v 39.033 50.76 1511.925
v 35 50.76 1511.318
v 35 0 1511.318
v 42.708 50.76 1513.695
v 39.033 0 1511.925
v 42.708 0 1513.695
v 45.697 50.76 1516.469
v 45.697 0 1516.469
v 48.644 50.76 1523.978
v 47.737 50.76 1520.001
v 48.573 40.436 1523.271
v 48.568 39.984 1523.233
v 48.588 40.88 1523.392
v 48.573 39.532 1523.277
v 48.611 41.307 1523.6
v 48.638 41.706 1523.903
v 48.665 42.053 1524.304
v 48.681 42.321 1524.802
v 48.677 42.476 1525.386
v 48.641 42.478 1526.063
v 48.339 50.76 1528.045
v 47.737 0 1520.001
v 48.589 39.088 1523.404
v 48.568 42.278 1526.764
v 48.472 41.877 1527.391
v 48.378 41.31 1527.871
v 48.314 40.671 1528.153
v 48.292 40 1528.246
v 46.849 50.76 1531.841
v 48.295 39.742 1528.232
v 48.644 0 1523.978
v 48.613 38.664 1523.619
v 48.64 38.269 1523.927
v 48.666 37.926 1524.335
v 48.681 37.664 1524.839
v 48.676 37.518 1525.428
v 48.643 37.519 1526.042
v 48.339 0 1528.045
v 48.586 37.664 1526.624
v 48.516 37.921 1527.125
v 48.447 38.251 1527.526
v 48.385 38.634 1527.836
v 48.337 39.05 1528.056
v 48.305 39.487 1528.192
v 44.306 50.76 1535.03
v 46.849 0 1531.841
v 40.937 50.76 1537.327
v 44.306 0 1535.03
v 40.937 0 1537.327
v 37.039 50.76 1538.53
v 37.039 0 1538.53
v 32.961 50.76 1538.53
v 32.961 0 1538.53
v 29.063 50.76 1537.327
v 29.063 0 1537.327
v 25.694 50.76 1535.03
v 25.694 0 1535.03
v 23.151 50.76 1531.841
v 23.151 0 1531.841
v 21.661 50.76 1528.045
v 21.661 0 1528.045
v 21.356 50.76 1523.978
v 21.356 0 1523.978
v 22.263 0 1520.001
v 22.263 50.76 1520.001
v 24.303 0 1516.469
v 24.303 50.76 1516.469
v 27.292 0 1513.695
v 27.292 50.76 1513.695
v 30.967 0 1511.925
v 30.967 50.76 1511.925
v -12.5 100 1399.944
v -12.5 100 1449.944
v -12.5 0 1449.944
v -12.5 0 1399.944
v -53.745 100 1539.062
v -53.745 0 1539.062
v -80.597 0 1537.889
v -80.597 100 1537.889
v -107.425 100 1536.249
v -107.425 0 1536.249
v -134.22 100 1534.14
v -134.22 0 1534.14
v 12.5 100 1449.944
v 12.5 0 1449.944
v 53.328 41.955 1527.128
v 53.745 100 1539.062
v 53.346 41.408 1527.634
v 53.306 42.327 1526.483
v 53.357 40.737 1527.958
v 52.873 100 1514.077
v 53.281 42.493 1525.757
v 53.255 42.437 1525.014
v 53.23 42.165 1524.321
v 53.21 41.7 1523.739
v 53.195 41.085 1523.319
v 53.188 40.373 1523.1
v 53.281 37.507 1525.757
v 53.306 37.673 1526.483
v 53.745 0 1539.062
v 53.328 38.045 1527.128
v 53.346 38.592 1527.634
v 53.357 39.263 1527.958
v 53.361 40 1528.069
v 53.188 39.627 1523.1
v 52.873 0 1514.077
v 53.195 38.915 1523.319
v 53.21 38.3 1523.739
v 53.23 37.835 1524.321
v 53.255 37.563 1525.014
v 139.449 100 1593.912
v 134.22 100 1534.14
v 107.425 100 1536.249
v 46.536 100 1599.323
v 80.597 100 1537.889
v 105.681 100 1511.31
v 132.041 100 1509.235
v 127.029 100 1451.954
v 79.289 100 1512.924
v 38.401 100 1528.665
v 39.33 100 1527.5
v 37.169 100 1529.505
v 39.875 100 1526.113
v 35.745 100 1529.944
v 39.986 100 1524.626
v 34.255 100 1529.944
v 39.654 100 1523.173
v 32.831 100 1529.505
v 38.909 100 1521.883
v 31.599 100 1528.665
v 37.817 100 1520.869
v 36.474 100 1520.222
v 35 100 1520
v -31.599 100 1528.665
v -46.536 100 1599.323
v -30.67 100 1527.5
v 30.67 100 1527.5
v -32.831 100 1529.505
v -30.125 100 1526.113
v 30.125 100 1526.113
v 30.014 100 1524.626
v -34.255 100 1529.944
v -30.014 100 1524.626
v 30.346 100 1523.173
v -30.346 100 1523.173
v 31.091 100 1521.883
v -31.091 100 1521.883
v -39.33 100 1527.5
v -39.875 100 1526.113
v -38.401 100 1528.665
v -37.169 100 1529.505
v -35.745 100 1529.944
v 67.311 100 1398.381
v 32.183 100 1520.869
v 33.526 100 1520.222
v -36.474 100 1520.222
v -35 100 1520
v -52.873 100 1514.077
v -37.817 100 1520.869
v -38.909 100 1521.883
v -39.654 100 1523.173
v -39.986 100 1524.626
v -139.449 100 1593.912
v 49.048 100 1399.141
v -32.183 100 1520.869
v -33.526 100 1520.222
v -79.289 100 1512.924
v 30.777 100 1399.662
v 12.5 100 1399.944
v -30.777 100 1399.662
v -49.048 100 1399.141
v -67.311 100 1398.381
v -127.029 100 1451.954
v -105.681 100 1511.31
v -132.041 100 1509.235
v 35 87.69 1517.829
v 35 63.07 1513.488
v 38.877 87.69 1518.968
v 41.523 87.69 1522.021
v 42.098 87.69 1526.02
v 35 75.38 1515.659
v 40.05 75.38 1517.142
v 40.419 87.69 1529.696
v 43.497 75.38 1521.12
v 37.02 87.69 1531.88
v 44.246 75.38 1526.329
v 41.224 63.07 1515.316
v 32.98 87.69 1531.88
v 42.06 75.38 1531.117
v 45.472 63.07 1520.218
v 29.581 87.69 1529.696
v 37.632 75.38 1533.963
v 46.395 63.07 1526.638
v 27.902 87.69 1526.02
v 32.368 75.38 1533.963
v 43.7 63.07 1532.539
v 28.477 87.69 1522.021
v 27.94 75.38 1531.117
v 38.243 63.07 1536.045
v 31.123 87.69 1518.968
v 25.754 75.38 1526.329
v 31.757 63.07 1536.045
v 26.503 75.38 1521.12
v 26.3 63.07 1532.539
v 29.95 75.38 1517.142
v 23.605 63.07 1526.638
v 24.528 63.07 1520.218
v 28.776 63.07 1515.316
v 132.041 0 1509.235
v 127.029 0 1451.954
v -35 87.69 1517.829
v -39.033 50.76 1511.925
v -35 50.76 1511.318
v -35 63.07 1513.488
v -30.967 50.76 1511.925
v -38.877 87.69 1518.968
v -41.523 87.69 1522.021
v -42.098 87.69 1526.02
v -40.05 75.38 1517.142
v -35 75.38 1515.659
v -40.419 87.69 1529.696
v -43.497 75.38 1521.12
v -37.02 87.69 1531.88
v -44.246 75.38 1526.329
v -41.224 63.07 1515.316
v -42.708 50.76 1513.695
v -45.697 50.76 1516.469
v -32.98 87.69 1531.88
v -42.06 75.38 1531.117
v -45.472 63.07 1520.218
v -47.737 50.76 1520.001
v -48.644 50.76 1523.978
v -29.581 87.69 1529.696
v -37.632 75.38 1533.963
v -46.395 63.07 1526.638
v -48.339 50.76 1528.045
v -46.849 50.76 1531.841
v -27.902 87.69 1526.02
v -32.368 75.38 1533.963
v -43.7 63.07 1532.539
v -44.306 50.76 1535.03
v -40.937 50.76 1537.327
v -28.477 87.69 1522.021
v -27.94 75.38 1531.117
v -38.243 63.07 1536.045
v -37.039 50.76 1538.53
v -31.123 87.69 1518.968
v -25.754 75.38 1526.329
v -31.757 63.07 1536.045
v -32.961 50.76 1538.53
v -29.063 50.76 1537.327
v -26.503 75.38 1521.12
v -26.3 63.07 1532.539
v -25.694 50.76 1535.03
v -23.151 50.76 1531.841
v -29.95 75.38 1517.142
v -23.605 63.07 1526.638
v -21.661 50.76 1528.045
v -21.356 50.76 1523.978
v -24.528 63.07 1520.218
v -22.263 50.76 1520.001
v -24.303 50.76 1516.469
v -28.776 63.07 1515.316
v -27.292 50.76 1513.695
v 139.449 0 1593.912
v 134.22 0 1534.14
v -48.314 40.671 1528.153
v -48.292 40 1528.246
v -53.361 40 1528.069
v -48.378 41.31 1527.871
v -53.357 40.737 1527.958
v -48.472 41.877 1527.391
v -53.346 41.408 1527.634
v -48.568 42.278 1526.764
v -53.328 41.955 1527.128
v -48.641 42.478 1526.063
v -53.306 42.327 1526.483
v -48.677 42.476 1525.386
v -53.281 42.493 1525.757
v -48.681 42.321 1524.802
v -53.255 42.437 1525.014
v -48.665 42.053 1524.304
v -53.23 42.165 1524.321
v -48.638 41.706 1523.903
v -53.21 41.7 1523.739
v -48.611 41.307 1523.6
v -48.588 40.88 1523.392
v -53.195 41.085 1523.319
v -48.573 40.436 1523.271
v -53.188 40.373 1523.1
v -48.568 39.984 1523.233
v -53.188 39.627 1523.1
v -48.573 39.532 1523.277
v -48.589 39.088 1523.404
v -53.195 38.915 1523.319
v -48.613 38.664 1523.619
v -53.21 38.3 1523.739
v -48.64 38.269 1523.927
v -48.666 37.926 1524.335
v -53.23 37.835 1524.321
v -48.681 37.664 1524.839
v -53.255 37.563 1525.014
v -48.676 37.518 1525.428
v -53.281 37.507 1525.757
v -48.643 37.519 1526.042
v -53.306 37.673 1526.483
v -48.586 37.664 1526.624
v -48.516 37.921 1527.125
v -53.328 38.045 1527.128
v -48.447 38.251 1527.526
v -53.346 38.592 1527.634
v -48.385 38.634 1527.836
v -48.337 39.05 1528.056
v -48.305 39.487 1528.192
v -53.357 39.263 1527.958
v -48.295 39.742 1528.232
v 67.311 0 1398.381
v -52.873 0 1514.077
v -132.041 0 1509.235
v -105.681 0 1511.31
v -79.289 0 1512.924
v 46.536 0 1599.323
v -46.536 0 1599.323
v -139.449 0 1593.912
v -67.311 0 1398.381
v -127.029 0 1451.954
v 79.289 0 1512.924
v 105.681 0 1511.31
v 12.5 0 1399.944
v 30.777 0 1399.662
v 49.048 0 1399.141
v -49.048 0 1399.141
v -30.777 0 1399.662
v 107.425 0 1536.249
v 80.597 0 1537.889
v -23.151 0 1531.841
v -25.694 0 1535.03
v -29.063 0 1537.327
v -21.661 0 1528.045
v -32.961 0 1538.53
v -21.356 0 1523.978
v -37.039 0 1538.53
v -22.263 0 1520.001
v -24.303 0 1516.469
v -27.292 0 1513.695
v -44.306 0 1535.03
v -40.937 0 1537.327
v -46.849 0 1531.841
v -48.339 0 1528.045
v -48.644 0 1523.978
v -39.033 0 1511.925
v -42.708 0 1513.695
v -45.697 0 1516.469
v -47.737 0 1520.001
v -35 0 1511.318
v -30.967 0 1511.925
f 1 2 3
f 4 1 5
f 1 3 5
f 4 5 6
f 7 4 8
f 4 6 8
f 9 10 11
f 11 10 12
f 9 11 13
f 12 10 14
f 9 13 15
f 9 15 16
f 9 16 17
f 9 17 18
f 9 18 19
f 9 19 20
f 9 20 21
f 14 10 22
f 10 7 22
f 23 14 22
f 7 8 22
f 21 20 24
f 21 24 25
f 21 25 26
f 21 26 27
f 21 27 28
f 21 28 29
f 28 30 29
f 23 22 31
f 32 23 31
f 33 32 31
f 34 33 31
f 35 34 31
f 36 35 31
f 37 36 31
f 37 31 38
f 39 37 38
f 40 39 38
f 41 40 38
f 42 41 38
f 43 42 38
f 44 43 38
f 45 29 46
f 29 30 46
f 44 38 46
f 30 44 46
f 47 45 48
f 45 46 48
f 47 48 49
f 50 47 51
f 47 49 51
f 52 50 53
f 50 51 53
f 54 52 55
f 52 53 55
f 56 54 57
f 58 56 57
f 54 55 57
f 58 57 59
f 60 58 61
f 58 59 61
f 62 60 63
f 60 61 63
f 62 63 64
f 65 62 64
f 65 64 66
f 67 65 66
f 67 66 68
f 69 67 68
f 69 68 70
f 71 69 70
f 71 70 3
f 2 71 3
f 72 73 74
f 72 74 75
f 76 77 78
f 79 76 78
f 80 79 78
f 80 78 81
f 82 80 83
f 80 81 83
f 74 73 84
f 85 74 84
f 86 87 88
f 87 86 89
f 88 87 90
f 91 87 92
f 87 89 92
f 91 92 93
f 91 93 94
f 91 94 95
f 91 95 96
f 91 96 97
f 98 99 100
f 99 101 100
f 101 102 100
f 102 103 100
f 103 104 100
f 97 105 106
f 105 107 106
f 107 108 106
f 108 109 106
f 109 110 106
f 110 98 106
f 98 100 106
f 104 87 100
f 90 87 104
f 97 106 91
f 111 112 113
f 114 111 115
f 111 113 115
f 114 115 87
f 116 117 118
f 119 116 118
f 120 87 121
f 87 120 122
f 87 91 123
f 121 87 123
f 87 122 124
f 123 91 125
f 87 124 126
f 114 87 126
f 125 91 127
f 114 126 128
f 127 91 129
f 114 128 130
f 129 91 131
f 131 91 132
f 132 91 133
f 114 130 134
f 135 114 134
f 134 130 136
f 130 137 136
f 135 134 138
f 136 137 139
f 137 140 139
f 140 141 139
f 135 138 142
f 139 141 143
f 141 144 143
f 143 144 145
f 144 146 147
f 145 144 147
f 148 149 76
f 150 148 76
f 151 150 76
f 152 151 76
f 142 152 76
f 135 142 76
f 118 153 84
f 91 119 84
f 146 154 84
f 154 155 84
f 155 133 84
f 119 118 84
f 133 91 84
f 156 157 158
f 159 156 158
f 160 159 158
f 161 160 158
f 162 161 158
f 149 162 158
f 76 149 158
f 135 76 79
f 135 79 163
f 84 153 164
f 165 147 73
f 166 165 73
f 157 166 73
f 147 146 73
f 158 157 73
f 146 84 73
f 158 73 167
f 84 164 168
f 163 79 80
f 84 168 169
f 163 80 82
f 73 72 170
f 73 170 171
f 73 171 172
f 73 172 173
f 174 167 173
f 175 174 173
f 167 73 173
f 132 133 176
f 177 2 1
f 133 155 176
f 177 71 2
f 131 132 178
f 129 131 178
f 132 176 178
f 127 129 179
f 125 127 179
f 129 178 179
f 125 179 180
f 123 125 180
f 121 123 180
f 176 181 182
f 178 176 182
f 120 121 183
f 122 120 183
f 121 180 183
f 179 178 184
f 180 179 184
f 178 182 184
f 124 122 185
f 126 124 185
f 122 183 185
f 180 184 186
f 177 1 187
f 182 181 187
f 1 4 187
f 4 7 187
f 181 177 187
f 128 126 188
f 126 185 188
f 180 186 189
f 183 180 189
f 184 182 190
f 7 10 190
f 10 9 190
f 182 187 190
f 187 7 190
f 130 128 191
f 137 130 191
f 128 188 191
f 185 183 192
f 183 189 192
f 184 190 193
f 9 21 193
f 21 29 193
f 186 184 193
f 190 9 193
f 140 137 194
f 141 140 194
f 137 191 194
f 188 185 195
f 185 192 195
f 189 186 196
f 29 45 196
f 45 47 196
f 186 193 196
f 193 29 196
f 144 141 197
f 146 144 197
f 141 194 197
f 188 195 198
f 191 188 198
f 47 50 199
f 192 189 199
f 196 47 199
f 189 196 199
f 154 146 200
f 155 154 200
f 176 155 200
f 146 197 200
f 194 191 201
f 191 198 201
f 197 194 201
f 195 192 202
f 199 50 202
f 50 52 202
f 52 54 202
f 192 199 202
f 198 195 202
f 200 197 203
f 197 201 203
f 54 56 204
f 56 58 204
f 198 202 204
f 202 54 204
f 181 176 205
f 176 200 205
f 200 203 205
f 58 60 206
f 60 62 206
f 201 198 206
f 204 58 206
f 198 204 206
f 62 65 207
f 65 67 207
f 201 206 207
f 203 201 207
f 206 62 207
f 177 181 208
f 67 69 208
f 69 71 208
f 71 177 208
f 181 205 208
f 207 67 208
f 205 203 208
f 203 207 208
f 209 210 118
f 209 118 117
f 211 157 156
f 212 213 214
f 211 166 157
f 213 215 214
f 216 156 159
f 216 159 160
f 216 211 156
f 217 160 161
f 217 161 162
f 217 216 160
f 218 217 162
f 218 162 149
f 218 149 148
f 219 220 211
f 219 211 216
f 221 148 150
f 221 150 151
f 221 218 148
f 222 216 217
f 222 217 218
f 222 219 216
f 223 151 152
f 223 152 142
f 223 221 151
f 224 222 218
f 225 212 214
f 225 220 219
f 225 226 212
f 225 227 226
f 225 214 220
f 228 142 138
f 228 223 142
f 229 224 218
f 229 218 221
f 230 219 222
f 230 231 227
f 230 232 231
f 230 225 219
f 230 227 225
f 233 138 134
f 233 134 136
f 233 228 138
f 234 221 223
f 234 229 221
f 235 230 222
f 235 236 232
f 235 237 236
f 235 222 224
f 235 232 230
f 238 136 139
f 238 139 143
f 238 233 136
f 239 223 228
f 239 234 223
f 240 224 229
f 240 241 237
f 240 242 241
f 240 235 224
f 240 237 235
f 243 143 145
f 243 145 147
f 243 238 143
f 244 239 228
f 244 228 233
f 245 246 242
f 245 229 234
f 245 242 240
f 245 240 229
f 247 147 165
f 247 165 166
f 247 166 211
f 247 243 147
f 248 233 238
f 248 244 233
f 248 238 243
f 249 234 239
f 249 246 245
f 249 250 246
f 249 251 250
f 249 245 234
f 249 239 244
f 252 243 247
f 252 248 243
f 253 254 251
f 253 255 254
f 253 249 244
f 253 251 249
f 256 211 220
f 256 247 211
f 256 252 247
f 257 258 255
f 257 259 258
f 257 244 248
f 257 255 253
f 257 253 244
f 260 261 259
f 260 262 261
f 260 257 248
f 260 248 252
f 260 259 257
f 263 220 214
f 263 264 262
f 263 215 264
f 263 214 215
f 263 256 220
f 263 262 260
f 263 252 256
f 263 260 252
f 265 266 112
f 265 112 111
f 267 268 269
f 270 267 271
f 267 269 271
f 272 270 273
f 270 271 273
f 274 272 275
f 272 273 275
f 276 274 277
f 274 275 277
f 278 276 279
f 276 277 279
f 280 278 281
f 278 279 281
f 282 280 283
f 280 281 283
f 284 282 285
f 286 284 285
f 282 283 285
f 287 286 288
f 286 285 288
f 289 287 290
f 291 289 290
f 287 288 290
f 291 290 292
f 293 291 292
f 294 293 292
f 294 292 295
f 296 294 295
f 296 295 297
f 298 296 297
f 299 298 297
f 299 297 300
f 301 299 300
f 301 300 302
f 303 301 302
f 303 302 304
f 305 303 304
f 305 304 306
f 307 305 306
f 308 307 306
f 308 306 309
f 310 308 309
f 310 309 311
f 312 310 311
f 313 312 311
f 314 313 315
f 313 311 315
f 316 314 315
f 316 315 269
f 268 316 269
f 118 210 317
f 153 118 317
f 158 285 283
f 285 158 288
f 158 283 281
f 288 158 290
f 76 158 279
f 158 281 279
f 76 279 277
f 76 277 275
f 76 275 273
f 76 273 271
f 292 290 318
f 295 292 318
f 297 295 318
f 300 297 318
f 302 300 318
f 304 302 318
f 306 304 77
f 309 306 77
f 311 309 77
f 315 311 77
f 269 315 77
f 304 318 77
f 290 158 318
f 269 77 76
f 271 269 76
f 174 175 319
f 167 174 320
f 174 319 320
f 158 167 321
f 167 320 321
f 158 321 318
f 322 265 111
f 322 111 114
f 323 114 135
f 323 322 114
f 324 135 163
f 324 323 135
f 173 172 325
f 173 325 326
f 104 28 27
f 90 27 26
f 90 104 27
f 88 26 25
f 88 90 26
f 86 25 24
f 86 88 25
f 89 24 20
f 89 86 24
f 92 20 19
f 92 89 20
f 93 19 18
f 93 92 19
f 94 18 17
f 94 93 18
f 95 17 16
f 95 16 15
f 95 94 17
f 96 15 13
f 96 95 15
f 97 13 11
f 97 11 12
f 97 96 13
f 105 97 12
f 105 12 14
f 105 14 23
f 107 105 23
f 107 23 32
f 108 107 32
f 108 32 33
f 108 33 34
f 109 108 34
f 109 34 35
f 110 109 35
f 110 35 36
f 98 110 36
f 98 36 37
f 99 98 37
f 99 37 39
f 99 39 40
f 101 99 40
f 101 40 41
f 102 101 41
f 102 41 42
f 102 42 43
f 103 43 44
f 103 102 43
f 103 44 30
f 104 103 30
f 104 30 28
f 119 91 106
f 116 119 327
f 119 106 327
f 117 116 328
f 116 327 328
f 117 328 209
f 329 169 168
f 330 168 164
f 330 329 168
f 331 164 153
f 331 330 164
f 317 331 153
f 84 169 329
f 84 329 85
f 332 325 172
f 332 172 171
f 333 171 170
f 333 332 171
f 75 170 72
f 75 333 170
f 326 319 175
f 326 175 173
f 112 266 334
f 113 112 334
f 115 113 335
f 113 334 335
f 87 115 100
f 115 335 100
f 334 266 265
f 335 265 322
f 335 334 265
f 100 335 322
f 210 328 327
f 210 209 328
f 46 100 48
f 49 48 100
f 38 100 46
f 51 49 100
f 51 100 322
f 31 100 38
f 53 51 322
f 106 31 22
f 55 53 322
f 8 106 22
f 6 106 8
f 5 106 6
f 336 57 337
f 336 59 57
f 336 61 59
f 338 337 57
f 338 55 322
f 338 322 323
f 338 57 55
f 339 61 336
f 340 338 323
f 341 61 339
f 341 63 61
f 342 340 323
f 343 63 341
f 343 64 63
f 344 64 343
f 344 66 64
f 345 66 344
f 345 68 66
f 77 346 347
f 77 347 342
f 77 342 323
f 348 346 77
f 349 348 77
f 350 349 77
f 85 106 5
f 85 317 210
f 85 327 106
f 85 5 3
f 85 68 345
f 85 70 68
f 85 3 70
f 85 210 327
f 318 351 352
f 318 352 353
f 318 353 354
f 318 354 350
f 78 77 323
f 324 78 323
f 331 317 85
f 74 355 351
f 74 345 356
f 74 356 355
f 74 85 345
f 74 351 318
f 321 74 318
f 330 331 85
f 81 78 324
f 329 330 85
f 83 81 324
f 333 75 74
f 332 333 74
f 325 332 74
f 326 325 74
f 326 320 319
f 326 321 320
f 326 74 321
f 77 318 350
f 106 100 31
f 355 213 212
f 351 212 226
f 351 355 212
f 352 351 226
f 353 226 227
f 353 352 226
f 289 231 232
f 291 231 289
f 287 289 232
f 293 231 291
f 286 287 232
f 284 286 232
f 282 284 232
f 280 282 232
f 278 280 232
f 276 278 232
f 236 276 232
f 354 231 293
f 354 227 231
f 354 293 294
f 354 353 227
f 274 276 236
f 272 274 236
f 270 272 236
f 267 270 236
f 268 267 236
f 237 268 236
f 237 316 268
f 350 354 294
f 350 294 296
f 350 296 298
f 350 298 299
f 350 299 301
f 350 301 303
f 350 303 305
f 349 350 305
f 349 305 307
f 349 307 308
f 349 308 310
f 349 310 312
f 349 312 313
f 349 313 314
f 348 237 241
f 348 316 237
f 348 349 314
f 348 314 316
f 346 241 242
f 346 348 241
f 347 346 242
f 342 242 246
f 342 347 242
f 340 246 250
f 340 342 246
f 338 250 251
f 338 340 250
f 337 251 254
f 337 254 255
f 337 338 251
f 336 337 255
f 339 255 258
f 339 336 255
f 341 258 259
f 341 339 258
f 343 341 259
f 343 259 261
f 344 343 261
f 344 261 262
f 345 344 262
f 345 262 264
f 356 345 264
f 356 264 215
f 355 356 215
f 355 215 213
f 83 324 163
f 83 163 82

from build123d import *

# Parameters (mm, degrees)
EXTRUDE_1_DEPTH         = 100
CUT_EXTRUDE_2_DEPTH     = 1610.175588972
CUT_EXTRUDE_7_DEPTH     = 1610.175588972
HOLE_WIZARD_M6_1_REACH  = 1611.176
HOLE_WIZARD_M6_1_BORE_R = 2.5
CUT_EXTRUDE_8_REACH     = 1611.176


with BuildPart() as part:
    # 草图3 → 凸台-拉伸1 (new body)
    with BuildSketch(Plane(origin=(0, 0, 0), x_dir=(1, 0, 0), z_dir=(0, 1, 0))):
        with BuildLine():
            Line((-139.449188396, -1593.911516947), (-122.018039847, -1394.672577328))
            ThreePointArc((-122.018039847, -1394.672577328), (0, -1400), (122.018039847, -1394.672577328))
            Line((122.018039847, -1394.672577328), (139.449188396, -1593.911516947))
            ThreePointArc((139.449188396, -1593.911516947), (0, -1600), (-139.449188396, -1593.911516947))
        make_face()
    extrude(amount=EXTRUDE_1_DEPTH)

    # 草图6 → 切除-拉伸2 (cut, through all)
    with BuildSketch(Plane(origin=(0, 100, 0), x_dir=(1, 0, 0), z_dir=(0, 1, 0))):
        Polygon((-12.5, -1399.944195316), (12.5, -1399.944195316), (12.5, -1449.944195316), (0, -1449.944195316), (-12.5, -1449.944195316), align=None)
    extrude(amount=-CUT_EXTRUDE_2_DEPTH, mode=Mode.SUBTRACT)

    # 草图8 → 切除-旋转1 (revolve, cut)
    with BuildSketch(Plane(origin=(-35, 0, 0), x_dir=(0, 0, -1), z_dir=(1, 0, 0)), mode=Mode.PRIVATE) as cut_revolve_1_sk:
        Polygon((-1525, 100), (-1530, 100), (-1538.682408883, 50.759612349), (-1538.682408883, 0), (-1525, 0), align=None)
    cut_revolve_1 = revolve(cut_revolve_1_sk.sketch.rotate(Axis((-35, 0, 1525), (0, 1, 0)), 180), axis=Axis((-35, 0, 1525), (0, 1, 0)), mode=Mode.SUBTRACT)

    # 镜向1: 切除-旋转1 across plane
    add(cut_revolve_1.mirror(Plane.ZY), mode=Mode.SUBTRACT)

    # 草图10 → 切除-拉伸7 (cut, through all)
    with BuildSketch(Plane.XZ):
        with BuildLine():
            Line((-134.219843831, 1534.139835061), (-132.040950263, 1509.234967609))
            ThreePointArc((-132.040950263, 1509.234967609), (-92.488537395, 1512.174219609), (-52.872737504, 1514.077102934))
            Line((-52.872737504, 1514.077102934), (-53.745224922, 1539.061873609))
            ThreePointArc((-53.745224922, 1539.061873609), (-94.014750884, 1537.12758957), (-134.219843831, 1534.139835061))
        make_face()
        with BuildLine():
            Line((53.745224922, 1539.061873609), (52.872737504, 1514.077102934))
            ThreePointArc((52.872737504, 1514.077102934), (92.488537395, 1512.174219609), (132.040950263, 1509.234967609))
            Line((132.040950263, 1509.234967609), (134.219843831, 1534.139835061))
            ThreePointArc((134.219843831, 1534.139835061), (94.014750884, 1537.12758957), (53.745224922, 1539.061873609))
        make_face()
    extrude(amount=-CUT_EXTRUDE_7_DEPTH, mode=Mode.SUBTRACT)

    # M6 螺纹孔的螺纹孔钻头1 bore → M6 螺纹孔的螺纹孔钻头1 (cut, up to next)
    with BuildSketch(Plane(origin=(0, 0, 0), x_dir=(-0.0348994967024942, 0, 0.999390827019096), z_dir=(-0.999390827019096, 0, -0.0348994967024942)), mode=Mode.PRIVATE) as hole_wizard_m6_1_sk1:
        with Locations((1526.5, 40)):
            Circle(HOLE_WIZARD_M6_1_BORE_R)
    hole_wizard_m6_1_tool1 = extrude(hole_wizard_m6_1_sk1.sketch, amount=-HOLE_WIZARD_M6_1_REACH, mode=Mode.PRIVATE) & part.part
    hole_wizard_m6_1 = hole_wizard_m6_1_tool1.solids().sort_by_distance((-53.274082, 40, 1525.570097))[0]
    add(hole_wizard_m6_1, mode=Mode.SUBTRACT)

    # 镜向2: M6 螺纹孔的螺纹孔钻头1 across plane
    add(hole_wizard_m6_1.mirror(Plane.ZY), mode=Mode.SUBTRACT)

    # 草图14 → 切除-拉伸8 (cut, up to next)
    with BuildSketch(Plane.XZ, mode=Mode.PRIVATE) as cut_extrude_8_sk1:
        with BuildLine():
            Line((127.029495055, 1451.953772469), (67.310647375, 1398.380948365))
            ThreePointArc((67.310647375, 1398.380948365), (94.682500787, 1396.794624862), (122.018039847, 1394.672577328))
            Line((122.018039847, 1394.672577328), (127.029495055, 1451.953772469))
        make_face()
    cut_extrude_8_tool1 = extrude(cut_extrude_8_sk1.sketch, amount=-CUT_EXTRUDE_8_REACH, mode=Mode.PRIVATE) & part.part
    # 草图14 → 切除-拉伸8 (cut, up to next)
    with BuildSketch(Plane.XZ, mode=Mode.PRIVATE) as cut_extrude_8_sk2:
        with BuildLine():
            Line((-127.029495055, 1451.953772469), (-122.018039847, 1394.672577328))
            ThreePointArc((-122.018039847, 1394.672577328), (-94.682500787, 1396.794624862), (-67.310647375, 1398.380948365))
            Line((-67.310647375, 1398.380948365), (-127.029495055, 1451.953772469))
        make_face()
    cut_extrude_8_tool2 = extrude(cut_extrude_8_sk2.sketch, amount=-CUT_EXTRUDE_8_REACH, mode=Mode.PRIVATE) & part.part
    add(cut_extrude_8_tool1.solids().sort_by_distance((105.520281, 0, 1415.117528))[0], mode=Mode.SUBTRACT)
    add(cut_extrude_8_tool2.solids().sort_by_distance((-105.520281, 0, 1415.117528))[0], mode=Mode.SUBTRACT)


solid = part.part
